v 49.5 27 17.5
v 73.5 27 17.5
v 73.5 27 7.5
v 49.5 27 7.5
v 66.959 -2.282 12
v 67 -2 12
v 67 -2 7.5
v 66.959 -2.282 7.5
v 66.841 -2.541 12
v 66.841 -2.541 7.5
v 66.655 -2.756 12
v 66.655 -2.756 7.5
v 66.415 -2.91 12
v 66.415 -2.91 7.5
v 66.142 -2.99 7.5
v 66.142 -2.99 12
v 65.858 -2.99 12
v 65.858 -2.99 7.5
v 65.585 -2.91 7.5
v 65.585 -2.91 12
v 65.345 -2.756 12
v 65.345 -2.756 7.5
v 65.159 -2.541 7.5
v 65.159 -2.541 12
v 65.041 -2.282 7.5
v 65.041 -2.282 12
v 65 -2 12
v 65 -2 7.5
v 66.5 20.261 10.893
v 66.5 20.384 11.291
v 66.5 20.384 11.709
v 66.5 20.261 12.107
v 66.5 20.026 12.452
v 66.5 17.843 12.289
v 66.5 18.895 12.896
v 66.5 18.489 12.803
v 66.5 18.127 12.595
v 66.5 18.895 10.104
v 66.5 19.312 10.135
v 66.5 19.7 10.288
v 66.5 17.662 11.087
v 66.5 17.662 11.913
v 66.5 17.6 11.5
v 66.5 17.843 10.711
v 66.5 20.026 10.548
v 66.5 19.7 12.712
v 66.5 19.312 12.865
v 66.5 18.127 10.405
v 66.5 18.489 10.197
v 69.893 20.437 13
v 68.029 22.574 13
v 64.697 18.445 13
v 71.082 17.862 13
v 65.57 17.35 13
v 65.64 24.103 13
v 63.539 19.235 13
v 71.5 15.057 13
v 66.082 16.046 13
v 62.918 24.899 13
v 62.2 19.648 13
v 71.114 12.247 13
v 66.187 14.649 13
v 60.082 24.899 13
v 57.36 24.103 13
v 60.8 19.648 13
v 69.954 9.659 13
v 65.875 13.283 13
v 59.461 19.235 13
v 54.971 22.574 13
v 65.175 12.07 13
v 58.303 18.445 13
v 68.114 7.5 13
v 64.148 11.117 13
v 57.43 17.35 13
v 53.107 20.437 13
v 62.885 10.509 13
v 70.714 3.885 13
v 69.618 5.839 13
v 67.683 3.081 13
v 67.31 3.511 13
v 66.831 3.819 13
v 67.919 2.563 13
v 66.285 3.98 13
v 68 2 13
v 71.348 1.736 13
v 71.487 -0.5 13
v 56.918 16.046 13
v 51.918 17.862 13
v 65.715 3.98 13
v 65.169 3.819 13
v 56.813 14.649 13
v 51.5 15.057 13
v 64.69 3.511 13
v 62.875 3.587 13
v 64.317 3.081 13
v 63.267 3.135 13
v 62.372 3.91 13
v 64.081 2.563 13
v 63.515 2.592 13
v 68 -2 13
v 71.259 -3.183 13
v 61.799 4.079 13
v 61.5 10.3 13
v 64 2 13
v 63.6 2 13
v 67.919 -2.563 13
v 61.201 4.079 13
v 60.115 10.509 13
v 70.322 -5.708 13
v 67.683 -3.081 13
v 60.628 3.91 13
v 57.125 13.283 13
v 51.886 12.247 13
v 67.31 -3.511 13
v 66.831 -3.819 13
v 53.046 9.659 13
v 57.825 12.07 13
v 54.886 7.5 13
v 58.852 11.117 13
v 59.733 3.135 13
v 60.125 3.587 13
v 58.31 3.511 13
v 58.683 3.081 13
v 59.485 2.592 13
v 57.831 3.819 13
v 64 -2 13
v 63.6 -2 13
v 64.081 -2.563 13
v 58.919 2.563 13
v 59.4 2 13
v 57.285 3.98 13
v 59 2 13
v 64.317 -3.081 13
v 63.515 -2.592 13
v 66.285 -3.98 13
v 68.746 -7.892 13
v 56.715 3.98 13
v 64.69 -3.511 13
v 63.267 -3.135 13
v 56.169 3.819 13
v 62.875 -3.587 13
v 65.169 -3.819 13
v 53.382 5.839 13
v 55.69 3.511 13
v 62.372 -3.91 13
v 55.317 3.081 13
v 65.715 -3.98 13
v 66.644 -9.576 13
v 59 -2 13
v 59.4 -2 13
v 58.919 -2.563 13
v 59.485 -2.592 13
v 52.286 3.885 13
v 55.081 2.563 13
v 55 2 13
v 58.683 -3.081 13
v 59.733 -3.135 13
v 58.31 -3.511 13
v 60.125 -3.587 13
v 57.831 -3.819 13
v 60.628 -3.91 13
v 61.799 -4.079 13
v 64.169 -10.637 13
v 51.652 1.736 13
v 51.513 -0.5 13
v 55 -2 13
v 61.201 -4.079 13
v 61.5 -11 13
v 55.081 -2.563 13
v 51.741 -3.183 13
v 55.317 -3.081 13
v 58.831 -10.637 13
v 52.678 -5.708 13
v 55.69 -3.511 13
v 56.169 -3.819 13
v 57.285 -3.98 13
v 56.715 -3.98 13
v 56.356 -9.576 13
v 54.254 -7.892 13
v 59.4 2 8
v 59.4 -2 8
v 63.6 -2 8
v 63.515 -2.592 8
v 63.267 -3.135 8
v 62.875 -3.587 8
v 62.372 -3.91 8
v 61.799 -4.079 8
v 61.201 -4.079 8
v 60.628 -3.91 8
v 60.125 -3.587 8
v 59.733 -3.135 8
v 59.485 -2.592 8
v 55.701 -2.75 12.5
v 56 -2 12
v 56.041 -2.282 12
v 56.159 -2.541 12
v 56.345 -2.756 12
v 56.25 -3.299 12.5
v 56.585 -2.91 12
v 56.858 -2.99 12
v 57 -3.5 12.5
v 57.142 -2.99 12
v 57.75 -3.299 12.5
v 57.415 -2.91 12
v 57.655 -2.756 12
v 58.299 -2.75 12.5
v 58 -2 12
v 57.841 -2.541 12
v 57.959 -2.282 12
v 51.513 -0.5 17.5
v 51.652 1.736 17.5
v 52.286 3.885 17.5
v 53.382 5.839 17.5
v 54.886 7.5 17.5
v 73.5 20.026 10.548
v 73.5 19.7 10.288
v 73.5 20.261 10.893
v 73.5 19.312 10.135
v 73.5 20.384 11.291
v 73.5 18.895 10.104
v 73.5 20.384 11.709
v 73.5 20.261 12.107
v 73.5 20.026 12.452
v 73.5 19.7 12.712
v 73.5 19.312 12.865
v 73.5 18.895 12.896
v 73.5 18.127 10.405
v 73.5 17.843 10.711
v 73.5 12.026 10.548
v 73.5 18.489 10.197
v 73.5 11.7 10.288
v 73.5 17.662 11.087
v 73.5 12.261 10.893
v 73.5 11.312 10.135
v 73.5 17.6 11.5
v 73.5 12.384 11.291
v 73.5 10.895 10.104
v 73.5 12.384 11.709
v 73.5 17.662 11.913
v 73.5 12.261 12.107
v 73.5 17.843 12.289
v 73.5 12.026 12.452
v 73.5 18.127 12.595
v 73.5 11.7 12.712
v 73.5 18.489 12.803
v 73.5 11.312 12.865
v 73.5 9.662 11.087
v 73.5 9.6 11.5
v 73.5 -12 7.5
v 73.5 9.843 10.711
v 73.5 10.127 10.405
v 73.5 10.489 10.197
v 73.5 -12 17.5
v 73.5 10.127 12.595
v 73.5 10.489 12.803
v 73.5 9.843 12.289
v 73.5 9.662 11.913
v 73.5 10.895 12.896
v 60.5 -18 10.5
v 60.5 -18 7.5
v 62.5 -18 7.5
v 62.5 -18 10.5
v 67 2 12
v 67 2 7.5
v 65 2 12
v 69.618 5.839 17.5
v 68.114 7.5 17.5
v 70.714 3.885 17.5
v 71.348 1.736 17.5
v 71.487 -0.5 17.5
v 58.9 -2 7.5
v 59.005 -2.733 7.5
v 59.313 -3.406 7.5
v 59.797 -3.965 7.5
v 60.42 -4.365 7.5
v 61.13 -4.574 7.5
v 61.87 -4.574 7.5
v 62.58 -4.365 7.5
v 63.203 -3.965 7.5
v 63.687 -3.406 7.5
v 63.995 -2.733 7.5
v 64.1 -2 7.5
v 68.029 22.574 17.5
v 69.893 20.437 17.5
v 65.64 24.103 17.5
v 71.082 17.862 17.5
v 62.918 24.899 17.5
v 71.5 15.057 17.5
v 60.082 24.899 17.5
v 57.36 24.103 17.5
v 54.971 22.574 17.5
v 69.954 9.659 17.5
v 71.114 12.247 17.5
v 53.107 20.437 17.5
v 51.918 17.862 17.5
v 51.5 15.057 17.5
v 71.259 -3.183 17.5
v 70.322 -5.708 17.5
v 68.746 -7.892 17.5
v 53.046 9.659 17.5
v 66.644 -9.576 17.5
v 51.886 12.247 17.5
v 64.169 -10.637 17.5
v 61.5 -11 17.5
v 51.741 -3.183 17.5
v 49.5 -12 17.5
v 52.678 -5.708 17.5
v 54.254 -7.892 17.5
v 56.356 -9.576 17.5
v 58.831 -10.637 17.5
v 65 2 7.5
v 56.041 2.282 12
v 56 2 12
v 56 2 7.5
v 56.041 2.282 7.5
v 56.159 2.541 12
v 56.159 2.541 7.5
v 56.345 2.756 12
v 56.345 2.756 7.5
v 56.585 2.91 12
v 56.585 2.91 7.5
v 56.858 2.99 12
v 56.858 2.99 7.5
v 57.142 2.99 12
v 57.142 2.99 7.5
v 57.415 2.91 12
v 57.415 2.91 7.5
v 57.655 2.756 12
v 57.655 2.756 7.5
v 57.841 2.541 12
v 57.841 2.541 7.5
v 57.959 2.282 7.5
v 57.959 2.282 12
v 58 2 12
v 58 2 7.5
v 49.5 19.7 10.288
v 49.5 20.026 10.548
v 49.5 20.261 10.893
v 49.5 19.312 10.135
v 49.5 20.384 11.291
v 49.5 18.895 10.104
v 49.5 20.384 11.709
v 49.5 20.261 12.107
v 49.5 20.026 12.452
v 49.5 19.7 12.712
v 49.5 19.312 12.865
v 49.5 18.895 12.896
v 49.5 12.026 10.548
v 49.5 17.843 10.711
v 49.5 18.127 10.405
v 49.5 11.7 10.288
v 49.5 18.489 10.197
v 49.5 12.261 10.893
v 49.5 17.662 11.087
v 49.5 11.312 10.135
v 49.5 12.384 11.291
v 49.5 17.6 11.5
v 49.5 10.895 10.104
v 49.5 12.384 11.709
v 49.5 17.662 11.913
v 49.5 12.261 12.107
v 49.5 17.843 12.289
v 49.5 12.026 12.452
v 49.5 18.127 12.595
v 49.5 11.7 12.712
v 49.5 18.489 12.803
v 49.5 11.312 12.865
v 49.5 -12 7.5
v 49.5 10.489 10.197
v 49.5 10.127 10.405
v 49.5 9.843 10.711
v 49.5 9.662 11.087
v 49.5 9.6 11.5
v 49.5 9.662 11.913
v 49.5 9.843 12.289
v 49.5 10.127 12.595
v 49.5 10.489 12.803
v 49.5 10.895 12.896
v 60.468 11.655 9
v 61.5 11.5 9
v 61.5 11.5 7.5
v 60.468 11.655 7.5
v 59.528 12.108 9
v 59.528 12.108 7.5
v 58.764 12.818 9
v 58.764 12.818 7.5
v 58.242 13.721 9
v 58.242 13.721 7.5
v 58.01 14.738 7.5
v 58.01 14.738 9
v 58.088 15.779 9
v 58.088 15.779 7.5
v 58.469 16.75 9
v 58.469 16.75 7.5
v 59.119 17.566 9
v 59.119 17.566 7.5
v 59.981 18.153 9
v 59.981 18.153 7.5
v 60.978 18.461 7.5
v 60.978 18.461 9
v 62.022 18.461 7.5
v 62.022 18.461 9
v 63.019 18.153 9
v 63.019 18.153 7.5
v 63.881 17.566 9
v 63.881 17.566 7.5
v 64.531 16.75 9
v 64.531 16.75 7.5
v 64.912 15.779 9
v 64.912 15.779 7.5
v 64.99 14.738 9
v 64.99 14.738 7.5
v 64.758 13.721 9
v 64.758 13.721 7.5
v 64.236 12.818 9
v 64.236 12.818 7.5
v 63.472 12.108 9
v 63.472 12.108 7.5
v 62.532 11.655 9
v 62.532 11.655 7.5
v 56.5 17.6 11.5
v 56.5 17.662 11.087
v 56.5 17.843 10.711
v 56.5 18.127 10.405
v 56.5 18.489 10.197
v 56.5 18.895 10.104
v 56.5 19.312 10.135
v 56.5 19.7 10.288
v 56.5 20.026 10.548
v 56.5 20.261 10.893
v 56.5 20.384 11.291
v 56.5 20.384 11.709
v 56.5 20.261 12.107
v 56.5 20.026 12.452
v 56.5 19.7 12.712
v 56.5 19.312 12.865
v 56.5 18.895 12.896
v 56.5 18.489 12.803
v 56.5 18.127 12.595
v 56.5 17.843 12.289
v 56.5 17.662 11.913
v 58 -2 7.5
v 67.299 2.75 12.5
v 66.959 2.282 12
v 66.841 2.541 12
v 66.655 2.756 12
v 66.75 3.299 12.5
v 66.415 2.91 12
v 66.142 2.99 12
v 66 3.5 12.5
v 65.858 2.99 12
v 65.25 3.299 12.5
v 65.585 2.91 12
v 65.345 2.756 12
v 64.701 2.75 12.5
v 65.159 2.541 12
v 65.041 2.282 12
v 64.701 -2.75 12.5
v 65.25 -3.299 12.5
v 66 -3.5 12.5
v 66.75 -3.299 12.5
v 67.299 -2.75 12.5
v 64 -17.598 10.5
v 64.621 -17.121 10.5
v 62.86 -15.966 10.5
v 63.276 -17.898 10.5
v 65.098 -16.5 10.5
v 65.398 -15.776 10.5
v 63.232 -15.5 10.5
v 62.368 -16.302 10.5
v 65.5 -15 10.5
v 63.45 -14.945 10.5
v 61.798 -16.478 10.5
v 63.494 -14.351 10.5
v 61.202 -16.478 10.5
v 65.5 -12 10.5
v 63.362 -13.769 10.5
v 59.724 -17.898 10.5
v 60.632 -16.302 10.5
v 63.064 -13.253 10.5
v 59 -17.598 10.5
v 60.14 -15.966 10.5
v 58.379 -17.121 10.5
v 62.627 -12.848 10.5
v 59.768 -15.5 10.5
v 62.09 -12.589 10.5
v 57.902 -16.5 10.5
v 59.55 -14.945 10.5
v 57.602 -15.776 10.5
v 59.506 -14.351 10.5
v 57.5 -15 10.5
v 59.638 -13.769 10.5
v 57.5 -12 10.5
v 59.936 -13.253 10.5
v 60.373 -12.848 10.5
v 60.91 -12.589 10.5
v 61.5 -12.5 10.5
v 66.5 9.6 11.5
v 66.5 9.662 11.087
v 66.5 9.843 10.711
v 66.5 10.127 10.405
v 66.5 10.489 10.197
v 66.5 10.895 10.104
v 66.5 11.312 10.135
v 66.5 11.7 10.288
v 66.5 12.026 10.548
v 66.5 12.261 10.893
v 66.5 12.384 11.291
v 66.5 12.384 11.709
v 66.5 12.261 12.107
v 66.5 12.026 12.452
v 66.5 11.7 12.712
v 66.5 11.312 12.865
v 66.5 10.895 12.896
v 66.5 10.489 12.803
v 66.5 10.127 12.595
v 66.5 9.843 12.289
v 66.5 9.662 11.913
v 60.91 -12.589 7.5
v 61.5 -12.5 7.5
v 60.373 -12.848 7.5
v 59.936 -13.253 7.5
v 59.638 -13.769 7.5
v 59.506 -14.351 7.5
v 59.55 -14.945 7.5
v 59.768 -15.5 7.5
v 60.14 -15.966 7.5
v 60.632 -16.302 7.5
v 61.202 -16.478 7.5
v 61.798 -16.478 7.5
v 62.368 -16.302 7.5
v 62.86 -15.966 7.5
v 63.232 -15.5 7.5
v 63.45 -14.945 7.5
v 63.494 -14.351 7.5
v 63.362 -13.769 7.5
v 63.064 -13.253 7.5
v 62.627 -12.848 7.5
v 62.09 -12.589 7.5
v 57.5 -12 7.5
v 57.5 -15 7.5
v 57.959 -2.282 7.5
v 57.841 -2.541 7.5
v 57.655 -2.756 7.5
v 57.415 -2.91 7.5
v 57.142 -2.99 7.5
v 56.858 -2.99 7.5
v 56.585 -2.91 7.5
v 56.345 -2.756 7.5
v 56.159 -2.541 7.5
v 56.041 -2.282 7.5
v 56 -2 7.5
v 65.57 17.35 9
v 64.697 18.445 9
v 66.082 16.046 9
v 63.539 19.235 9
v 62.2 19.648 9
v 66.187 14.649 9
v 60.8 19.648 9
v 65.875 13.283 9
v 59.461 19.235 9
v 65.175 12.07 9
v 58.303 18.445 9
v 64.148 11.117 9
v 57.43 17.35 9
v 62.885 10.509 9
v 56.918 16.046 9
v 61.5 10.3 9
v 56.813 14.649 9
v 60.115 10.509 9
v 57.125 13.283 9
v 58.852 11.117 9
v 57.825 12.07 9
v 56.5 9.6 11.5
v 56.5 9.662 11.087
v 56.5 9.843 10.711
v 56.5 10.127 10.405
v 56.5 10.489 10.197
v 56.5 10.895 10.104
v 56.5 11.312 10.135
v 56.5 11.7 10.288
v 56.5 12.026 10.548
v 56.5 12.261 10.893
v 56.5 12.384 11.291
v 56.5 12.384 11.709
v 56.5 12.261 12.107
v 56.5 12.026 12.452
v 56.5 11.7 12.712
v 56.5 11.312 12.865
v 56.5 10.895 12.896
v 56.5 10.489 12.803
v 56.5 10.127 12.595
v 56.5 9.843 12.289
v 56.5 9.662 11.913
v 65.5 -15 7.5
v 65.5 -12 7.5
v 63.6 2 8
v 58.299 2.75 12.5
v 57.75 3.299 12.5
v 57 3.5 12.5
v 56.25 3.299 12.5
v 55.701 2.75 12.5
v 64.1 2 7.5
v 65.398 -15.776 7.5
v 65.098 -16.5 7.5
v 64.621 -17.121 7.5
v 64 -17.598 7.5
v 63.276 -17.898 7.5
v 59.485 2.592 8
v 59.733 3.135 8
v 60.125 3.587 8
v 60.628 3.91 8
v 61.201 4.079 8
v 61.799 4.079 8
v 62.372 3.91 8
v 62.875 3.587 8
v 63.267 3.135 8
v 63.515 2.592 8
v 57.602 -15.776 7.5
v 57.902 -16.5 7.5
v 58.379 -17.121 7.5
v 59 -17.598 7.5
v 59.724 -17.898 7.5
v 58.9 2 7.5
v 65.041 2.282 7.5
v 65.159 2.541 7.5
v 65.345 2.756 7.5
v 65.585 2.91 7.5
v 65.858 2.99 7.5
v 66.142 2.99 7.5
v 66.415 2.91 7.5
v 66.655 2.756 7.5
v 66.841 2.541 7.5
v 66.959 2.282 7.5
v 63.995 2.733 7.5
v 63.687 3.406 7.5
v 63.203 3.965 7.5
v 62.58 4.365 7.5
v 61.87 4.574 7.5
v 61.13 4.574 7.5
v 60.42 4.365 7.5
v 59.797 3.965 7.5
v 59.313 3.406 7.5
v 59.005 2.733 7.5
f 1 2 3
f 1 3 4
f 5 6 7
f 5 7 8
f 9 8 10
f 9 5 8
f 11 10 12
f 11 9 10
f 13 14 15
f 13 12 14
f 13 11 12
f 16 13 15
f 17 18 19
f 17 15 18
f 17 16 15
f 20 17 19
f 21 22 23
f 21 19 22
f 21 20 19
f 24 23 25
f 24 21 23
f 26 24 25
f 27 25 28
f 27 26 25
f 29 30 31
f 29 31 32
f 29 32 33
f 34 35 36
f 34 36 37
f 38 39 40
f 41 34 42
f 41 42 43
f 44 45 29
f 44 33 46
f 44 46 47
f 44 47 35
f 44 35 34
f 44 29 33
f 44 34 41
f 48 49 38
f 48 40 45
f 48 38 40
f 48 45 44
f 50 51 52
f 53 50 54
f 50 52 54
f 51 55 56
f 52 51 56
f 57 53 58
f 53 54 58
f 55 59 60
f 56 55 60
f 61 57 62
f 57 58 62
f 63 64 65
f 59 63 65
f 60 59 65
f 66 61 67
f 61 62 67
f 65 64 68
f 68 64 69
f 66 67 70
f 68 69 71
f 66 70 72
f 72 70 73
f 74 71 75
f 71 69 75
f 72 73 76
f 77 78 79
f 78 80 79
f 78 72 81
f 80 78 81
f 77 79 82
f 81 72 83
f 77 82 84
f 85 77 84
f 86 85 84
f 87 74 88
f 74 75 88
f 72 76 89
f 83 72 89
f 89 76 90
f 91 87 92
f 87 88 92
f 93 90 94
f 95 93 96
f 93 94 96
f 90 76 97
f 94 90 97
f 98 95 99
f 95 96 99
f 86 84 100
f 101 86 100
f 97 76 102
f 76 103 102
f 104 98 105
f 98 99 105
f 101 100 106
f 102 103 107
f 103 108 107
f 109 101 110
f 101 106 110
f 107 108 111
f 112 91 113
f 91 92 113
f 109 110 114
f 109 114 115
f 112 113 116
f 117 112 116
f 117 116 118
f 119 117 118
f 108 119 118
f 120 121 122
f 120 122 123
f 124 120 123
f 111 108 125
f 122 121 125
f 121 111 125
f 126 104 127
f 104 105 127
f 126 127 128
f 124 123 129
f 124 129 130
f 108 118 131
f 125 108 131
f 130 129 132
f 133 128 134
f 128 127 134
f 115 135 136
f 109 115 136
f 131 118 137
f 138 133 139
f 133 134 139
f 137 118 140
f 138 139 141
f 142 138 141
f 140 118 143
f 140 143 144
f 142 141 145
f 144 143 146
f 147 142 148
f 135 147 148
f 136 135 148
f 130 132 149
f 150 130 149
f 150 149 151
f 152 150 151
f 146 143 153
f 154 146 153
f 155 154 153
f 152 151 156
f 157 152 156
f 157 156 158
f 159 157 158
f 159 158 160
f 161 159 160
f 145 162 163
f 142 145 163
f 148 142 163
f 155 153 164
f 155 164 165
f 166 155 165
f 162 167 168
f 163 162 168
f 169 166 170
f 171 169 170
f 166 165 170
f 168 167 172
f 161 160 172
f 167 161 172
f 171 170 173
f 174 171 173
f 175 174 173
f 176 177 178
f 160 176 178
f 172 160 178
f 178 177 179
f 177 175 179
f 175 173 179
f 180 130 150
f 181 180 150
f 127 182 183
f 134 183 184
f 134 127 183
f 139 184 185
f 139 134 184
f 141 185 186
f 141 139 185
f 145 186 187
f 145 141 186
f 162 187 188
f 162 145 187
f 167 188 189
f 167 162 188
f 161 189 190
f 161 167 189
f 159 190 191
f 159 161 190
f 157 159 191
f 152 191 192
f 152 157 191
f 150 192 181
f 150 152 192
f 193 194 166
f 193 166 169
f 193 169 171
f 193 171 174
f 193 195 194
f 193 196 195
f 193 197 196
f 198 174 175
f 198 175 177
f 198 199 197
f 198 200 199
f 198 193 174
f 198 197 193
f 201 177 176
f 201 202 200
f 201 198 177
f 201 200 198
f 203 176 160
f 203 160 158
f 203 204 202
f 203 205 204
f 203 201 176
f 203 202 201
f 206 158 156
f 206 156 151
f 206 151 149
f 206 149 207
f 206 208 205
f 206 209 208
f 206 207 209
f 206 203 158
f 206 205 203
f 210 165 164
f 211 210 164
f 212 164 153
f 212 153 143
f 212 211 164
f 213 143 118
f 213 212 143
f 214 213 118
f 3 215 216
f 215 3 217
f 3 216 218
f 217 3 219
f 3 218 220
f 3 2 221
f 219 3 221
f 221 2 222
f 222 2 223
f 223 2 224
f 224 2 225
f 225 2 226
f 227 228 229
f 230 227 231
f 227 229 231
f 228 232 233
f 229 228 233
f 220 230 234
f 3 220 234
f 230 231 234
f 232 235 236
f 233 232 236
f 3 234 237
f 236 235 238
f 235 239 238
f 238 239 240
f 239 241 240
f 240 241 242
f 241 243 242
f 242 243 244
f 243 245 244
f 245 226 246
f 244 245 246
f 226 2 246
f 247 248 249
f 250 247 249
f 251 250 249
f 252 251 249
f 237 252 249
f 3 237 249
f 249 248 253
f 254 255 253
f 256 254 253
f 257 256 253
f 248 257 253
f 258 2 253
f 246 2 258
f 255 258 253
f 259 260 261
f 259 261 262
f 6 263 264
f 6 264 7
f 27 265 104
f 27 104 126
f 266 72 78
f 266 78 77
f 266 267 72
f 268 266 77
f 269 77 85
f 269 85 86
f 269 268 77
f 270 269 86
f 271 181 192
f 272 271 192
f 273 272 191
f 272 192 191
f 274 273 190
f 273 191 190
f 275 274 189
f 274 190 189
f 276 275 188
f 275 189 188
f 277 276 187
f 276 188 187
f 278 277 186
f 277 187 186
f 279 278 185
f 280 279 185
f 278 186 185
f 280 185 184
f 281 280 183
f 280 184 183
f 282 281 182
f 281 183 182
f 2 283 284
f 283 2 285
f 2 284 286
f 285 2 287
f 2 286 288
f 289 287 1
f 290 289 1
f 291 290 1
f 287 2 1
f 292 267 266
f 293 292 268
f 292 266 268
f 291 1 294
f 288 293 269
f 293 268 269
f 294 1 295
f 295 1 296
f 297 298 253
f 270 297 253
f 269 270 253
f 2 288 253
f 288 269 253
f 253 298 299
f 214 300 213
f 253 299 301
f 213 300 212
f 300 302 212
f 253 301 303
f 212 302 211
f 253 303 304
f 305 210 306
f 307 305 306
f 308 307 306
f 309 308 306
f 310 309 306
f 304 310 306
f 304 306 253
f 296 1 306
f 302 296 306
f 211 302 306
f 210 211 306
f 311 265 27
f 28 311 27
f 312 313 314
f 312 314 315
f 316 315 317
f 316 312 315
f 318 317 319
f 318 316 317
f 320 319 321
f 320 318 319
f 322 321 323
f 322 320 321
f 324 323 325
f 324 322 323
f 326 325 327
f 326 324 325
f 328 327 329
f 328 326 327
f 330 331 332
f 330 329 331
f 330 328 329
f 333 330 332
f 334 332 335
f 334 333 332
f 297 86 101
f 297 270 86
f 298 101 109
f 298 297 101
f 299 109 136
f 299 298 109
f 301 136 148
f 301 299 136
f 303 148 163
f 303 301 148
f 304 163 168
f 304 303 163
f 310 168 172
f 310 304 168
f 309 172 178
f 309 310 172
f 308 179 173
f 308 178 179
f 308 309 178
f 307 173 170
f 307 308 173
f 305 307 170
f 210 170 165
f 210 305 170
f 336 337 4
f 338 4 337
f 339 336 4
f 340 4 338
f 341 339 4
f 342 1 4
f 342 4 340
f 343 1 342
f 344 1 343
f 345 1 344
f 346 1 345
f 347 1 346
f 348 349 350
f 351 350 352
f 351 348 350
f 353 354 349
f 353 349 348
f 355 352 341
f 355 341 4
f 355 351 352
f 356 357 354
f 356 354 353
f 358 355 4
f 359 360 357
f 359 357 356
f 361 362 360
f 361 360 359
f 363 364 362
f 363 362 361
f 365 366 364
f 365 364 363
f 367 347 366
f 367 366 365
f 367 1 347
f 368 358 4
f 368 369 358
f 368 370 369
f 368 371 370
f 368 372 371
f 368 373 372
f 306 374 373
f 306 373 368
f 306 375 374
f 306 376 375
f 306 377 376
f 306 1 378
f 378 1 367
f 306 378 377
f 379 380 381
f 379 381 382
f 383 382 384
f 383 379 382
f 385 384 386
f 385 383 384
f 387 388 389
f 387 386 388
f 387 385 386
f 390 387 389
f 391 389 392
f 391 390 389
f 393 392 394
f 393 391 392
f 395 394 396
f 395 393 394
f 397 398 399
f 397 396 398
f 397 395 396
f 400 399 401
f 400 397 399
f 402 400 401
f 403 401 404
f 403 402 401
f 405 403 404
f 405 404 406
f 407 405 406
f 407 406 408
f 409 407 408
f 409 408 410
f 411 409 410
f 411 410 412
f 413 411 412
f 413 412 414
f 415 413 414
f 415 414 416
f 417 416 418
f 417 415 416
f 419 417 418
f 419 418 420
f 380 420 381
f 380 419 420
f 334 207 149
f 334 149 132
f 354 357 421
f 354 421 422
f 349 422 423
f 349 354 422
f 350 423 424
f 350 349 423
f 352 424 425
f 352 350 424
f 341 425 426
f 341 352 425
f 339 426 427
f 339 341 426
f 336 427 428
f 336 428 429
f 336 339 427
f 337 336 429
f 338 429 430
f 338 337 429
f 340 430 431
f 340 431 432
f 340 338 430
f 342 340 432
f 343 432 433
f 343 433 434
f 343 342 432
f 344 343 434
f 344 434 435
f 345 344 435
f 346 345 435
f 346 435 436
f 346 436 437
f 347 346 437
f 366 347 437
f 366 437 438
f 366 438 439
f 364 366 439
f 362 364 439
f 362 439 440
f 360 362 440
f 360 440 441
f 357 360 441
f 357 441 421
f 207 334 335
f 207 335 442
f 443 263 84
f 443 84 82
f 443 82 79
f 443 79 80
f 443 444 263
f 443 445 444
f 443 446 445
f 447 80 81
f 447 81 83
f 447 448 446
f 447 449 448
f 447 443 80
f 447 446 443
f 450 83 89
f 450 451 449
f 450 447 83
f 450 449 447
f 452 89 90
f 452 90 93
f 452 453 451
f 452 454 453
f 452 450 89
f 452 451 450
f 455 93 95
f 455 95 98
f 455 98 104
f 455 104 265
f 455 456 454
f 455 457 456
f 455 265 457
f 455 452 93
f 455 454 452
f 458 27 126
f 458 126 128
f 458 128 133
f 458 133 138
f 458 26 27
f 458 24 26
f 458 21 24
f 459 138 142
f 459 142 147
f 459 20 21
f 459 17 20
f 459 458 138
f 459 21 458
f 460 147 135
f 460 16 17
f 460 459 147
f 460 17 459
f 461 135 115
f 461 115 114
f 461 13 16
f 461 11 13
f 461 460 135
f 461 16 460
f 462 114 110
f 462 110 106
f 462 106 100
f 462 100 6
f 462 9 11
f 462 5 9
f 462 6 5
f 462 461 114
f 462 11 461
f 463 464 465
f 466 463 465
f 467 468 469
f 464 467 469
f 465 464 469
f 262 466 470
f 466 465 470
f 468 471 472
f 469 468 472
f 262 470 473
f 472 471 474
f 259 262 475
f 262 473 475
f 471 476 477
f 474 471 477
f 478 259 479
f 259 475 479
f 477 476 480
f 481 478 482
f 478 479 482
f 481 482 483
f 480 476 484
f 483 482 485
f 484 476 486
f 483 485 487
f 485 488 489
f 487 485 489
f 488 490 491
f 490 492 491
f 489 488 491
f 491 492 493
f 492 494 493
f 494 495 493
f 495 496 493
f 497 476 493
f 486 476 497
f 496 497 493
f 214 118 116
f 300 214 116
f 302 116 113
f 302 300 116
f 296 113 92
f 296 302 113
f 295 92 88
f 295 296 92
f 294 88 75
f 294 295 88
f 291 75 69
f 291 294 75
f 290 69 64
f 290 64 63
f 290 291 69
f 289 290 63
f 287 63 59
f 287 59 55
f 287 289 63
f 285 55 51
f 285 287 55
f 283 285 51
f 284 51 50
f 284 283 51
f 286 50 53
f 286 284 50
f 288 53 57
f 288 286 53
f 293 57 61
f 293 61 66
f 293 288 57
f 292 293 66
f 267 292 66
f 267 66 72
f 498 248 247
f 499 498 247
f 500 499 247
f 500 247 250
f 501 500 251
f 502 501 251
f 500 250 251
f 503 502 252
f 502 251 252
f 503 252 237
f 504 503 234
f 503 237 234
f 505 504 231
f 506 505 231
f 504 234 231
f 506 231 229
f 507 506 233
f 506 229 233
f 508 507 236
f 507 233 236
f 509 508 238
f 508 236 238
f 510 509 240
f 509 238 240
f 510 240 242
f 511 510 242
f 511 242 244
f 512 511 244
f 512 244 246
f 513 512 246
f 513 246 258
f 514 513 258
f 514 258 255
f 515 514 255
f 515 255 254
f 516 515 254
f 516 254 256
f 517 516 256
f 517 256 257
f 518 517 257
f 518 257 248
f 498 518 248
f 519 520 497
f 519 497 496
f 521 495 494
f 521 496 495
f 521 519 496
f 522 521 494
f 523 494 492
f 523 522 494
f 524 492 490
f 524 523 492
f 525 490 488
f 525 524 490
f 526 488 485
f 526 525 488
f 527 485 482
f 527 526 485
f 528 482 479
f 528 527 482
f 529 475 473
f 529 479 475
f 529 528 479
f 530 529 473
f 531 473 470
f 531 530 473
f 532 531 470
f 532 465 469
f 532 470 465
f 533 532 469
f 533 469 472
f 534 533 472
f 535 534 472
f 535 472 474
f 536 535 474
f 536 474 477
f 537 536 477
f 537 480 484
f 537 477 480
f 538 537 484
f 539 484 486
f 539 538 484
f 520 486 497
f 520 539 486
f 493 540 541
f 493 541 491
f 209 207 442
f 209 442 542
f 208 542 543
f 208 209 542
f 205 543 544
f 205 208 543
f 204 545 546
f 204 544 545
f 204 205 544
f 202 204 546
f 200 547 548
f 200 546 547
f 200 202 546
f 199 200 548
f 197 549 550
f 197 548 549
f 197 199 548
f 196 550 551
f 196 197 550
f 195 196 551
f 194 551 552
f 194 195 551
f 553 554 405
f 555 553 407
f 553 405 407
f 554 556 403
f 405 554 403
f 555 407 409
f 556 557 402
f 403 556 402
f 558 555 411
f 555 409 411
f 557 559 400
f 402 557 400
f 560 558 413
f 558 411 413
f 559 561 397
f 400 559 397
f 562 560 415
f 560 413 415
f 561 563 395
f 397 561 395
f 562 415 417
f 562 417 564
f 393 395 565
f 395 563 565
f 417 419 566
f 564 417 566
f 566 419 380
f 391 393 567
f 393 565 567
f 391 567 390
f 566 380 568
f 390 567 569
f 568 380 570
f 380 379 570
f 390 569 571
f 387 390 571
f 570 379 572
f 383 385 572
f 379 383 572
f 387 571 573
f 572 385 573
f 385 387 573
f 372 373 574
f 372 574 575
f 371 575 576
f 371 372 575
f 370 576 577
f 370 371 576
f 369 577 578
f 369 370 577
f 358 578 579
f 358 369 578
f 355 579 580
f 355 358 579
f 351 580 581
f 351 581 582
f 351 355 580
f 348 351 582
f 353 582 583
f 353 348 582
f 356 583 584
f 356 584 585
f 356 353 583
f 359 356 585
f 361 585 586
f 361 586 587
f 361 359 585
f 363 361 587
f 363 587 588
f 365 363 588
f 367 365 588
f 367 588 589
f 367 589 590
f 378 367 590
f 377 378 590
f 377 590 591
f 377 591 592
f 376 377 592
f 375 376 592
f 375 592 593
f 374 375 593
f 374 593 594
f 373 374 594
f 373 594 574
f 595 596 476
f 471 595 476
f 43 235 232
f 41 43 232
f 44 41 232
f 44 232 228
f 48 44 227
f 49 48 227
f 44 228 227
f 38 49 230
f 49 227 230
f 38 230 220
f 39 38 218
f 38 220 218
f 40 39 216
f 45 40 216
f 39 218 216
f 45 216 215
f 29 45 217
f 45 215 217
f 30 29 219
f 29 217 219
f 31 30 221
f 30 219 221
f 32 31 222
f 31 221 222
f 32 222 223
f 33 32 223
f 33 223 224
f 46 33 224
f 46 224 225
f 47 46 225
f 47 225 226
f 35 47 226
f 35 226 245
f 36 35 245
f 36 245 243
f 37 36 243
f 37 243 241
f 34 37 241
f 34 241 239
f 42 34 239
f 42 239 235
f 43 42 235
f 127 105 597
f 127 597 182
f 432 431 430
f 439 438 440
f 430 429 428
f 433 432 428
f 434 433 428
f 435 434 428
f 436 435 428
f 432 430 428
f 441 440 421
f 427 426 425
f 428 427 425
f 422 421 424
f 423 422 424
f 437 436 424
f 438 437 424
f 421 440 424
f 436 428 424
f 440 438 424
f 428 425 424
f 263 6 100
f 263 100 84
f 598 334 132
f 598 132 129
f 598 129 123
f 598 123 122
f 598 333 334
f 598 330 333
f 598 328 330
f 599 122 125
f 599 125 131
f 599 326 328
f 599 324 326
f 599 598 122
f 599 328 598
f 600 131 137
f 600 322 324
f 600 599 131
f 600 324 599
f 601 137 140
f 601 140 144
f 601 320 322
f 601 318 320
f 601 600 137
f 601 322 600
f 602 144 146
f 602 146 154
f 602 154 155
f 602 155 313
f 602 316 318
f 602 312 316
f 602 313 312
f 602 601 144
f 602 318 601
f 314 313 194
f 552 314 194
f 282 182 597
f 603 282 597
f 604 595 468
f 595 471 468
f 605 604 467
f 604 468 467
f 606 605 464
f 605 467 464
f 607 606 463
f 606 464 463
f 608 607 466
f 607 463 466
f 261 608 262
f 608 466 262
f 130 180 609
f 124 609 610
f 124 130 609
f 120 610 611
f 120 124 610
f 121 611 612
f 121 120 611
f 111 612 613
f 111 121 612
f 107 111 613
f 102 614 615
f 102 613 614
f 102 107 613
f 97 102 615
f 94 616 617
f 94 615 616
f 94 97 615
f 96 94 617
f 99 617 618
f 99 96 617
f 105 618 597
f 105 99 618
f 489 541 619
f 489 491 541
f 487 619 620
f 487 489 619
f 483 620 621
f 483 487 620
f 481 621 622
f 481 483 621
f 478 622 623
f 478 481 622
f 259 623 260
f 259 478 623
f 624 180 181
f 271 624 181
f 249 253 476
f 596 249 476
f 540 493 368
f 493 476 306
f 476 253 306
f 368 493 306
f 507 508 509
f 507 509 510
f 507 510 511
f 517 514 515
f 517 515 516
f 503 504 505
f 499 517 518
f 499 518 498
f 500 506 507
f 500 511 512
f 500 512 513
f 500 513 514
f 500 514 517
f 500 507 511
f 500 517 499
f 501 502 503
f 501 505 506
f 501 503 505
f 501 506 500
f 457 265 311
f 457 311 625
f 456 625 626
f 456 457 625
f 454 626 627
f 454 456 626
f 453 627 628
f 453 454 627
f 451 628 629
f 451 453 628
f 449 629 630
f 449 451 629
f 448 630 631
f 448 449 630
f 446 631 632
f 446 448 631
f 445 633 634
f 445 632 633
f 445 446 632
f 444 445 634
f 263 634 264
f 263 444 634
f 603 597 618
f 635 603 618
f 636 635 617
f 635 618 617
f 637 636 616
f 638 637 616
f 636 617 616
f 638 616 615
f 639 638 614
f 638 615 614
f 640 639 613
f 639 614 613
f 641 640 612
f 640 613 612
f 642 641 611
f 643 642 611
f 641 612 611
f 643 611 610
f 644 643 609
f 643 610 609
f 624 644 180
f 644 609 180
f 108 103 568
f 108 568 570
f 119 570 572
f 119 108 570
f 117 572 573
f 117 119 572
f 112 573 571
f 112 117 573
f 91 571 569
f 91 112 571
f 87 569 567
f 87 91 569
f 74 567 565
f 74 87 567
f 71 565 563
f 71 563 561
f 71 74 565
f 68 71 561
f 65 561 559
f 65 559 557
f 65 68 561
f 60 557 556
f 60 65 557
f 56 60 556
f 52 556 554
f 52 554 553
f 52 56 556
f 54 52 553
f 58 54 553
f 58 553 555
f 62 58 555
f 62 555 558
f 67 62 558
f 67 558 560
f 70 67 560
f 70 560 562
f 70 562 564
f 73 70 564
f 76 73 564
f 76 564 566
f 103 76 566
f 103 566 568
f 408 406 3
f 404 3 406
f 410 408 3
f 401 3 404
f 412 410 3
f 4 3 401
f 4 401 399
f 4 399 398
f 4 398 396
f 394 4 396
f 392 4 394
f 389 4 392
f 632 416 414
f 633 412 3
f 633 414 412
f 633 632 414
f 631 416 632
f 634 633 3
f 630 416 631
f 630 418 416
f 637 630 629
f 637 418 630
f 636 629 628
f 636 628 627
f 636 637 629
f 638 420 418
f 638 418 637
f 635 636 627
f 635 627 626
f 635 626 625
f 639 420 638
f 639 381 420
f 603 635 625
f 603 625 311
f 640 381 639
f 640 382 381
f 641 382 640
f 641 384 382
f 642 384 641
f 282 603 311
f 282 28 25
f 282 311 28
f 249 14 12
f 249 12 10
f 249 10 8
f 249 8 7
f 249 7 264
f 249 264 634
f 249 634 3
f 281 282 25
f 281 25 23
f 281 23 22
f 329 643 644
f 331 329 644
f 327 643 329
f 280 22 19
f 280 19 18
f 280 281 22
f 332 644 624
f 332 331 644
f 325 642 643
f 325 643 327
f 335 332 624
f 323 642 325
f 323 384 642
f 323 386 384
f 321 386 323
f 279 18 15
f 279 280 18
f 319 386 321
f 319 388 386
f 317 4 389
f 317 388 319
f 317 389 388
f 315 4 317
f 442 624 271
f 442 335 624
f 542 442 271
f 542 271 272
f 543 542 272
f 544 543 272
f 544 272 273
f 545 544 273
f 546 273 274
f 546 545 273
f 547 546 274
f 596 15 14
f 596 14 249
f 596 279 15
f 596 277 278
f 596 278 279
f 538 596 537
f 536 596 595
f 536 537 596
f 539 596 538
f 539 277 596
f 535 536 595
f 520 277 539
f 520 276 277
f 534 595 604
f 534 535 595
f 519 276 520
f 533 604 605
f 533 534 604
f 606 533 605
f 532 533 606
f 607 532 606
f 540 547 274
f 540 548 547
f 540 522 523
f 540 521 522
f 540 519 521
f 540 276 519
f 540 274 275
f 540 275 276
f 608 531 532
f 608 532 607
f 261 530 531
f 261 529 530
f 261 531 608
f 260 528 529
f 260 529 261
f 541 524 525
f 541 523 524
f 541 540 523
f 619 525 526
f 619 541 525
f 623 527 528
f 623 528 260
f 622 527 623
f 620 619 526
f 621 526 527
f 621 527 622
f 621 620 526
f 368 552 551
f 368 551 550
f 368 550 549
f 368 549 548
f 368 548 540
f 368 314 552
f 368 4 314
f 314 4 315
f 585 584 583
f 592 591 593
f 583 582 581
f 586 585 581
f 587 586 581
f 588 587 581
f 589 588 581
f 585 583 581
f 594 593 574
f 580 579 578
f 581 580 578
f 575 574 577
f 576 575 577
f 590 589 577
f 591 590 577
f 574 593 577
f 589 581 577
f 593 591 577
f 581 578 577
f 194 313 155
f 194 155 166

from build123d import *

# Parameters (mm, degrees)
CYLINDER267_R                = 2
CYLINDER267_DEPTH            = 10
CYLINDER267_PITCH_ANGLE      = 90
BOX001027045199_W            = 3
BOX001027045199_H            = 8
BOX001027045199_DEPTH        = 8
FILLET045_R                  = 3
CUT239_PITCH_ANGLE           = 90
CYLINDER103_R                = 1.4
CYLINDER103_DEPTH            = 19
CYLINDER103_ROLL_ANGLE       = 90
CYLINDER105_R                = 1.4
CYLINDER105_DEPTH            = 19
CYLINDER105_ROLL_ANGLE       = 90
CYLINDER106_R                = 1.4
CYLINDER106_DEPTH            = 19
CYLINDER106_ROLL_ANGLE       = 90
CYLINDER027_R                = 1.4
CYLINDER027_DEPTH            = 19
CYLINDER027_ROLL_ANGLE       = 90
CYLINDER098_R                = 1
CYLINDER098_DEPTH            = 30
CYLINDER099_R                = 1
CYLINDER099_DEPTH            = 30
BOX001007_W                  = 4
BOX001007_H                  = 4.2
BOX001007_DEPTH              = 27
CYLINDER097_R                = 2.1
CYLINDER097_DEPTH            = 30
CYLINDER023_R                = 2.1
CYLINDER023_DEPTH            = 30
CYLINDER100_R                = 1
CYLINDER100_DEPTH            = 30
BOX001008_W                  = 4
BOX001008_H                  = 2
BOX001008_DEPTH              = 27
CYLINDER101_R                = 1
CYLINDER101_DEPTH            = 30
BOX001009_W                  = 4
BOX001009_H                  = 2
BOX001009_DEPTH              = 27
CYLINDER093_R                = 3.5
CYLINDER093_DEPTH            = 30
CYLINDER094_R                = 4.7
CYLINDER094_DEPTH            = 30
CYLINDER095_R                = 10
CYLINDER095_DEPTH            = 30
CYLINDER102_R                = 10
CYLINDER102_DEPTH            = 30
CYLINDER096_R                = 10
CYLINDER096_DEPTH            = 30
BOX001006_W                  = 39
BOX001006_H                  = 24
BOX001006_DEPTH              = 10
CHAMFER008_SIZE              = 1
CHAMFER014_SIZE              = 0.5
FUSION112154_ROLL_ANGLE      = 180
FUSION112154_PLACEMENT_ANGLE = -90


with BuildPart() as cylinder285:
    # Cylinder267 → Cylinder267 (new body)
    with BuildSketch(Plane.XY):
        Circle(CYLINDER267_R)
    extrude(amount=CYLINDER267_DEPTH)


with BuildPart() as cylinder285_1:
    # Cylinder267 pitch: moved
    add(cylinder285.part.rotate(Axis((0, 0, 0), (0, 1, 0)), CYLINDER267_PITCH_ANGLE))


with BuildPart() as cylinder285_2:
    # Cylinder267 placement: moved
    add(cylinder285_1.part.moved(Location((-3, 4, 4.5))))


with BuildPart() as cut239:
    # Box001027045199 → Box001027045199 (new body)
    with BuildSketch(Plane.XY):
        with Locations((1.5, 4)):
            Rectangle(BOX001027045199_W, BOX001027045199_H)
    extrude(amount=BOX001027045199_DEPTH)

    # Fillet045
    fillet045_edges = [cut239.edges().sort_by_distance(p)[0] for p in [
        (1.5, 0, 8),
        (1.5, 8, 8),
    ]]
    fillet(fillet045_edges, radius=FILLET045_R)

    # Cut239: cut Cylinder285
    add(cylinder285_2.part, mode=Mode.SUBTRACT)


with BuildPart() as cut239_1:
    # Cut239 pitch: moved
    add(cut239.part.rotate(Axis((0, 0, 0), (0, 1, 0)), CUT239_PITCH_ANGLE))


with BuildPart() as cut239_2:
    # Cut239 placement: moved
    add(cut239_1.part.moved(Location((25, -4, 10))))


with BuildPart() as cylinder103:
    # Cylinder103 → Cylinder103 (new body)
    with BuildSketch(Plane.XY):
        Circle(CYLINDER103_R)
    extrude(amount=CYLINDER103_DEPTH)


with BuildPart() as cylinder103_1:
    # Cylinder103 roll: moved
    add(cylinder103.part.rotate(Axis((0, 0, 0), (1, 0, 0)), CYLINDER103_ROLL_ANGLE))


with BuildPart() as cylinder103_2:
    # Cylinder103 placement: moved
    add(cylinder103_1.part.moved(Location((4, 24, 6))))


with BuildPart() as cylinder105:
    # Cylinder105 → Cylinder105 (new body)
    with BuildSketch(Plane.XY):
        Circle(CYLINDER105_R)
    extrude(amount=CYLINDER105_DEPTH)


with BuildPart() as cylinder105_1:
    # Cylinder105 roll: moved
    add(cylinder105.part.rotate(Axis((0, 0, 0), (1, 0, 0)), CYLINDER105_ROLL_ANGLE))


with BuildPart() as cylinder105_2:
    # Cylinder105 placement: moved
    add(cylinder105_1.part.moved(Location((-4, 24, 6))))


with BuildPart() as part_mirroring011:
    # Part__Mirroring011: instance of Cylinder105
    add(cylinder105_2.part.mirror(Plane(origin=(0, 0, 0), x_dir=(1, 0, 0), z_dir=(0, 1, 0))))


with BuildPart() as cylinder106:
    # Cylinder106 → Cylinder106 (new body)
    with BuildSketch(Plane.XY):
        Circle(CYLINDER106_R)
    extrude(amount=CYLINDER106_DEPTH)


with BuildPart() as cylinder106_1:
    # Cylinder106 roll: moved
    add(cylinder106.part.rotate(Axis((0, 0, 0), (1, 0, 0)), CYLINDER106_ROLL_ANGLE))


with BuildPart() as cylinder106_2:
    # Cylinder106 placement: moved
    add(cylinder106_1.part.moved(Location((4, 24, 6))))


with BuildPart() as part_mirroring012:
    # Part__Mirroring012: instance of Cylinder106
    add(cylinder106_2.part.mirror(Plane(origin=(0, 0, 0), x_dir=(1, 0, 0), z_dir=(0, 1, 0))))


with BuildPart() as m3_tap_a:
    # Cylinder027 → Cylinder027 (new body)
    with BuildSketch(Plane.XY):
        Circle(CYLINDER027_R)
    extrude(amount=CYLINDER027_DEPTH)


with BuildPart() as m3_tap_a_1:
    # Cylinder027 roll: moved
    add(m3_tap_a.part.rotate(Axis((0, 0, 0), (1, 0, 0)), CYLINDER027_ROLL_ANGLE))


with BuildPart() as m3_tap_a_2:
    # Cylinder027 placement: moved
    add(m3_tap_a_1.part.moved(Location((-4, 24, 6))))

    # Fusion062: union Cylinder103, Part__Mirroring011, Part__Mirroring012
    add(cylinder103_2.part)
    add(part_mirroring011.part)
    add(part_mirroring012.part)


with BuildPart() as cylinder109:
    # Cylinder098 → Cylinder098 (new body)
    with BuildSketch(Plane(origin=(17, -4.5, -12.5), x_dir=(1, 0, 0), z_dir=(0, 0, 1))):
        Circle(CYLINDER098_R)
    extrude(amount=CYLINDER098_DEPTH)


with BuildPart() as cylinder110:
    # Cylinder099 → Cylinder099 (new body)
    with BuildSketch(Plane(origin=(17, 4.5, -12.5), x_dir=(1, 0, 0), z_dir=(0, 0, 1))):
        Circle(CYLINDER099_R)
    extrude(amount=CYLINDER099_DEPTH)


with BuildPart() as cube046:
    # Box001007 → Box001007 (new body)
    with BuildSketch(Plane(origin=(13, -2.1, -11), x_dir=(1, 0, 0), z_dir=(0, 0, 1))):
        with Locations((2, 2.1)):
            Rectangle(BOX001007_W, BOX001007_H)
    extrude(amount=BOX001007_DEPTH)


with BuildPart() as cylinder108:
    # Cylinder097 → Cylinder097 (new body)
    with BuildSketch(Plane(origin=(17, 0, -12.5), x_dir=(1, 0, 0), z_dir=(0, 0, 1))):
        Circle(CYLINDER097_R)
    extrude(amount=CYLINDER097_DEPTH)


with BuildPart() as cylinder111:
    # Cylinder023 → Cylinder023 (new body)
    with BuildSketch(Plane(origin=(13, 0, -12.5), x_dir=(1, 0, 0), z_dir=(0, 0, 1))):
        Circle(CYLINDER023_R)
    extrude(amount=CYLINDER023_DEPTH)


with BuildPart() as cylinder112:
    # Cylinder100 → Cylinder100 (new body)
    with BuildSketch(Plane(origin=(13, -4.5, -12.5), x_dir=(1, 0, 0), z_dir=(0, 0, 1))):
        Circle(CYLINDER100_R)
    extrude(amount=CYLINDER100_DEPTH)


with BuildPart() as cube047:
    # Box001008 → Box001008 (new body)
    with BuildSketch(Plane(origin=(13, -5.5, -11), x_dir=(1, 0, 0), z_dir=(0, 0, 1))):
        with Locations((2, 1)):
            Rectangle(BOX001008_W, BOX001008_H)
    extrude(amount=BOX001008_DEPTH)


with BuildPart() as cylinder113:
    # Cylinder101 → Cylinder101 (new body)
    with BuildSketch(Plane(origin=(13, 4.5, -12.5), x_dir=(1, 0, 0), z_dir=(0, 0, 1))):
        Circle(CYLINDER101_R)
    extrude(amount=CYLINDER101_DEPTH)


with BuildPart() as motor_slots:
    # Box001009 → Box001009 (new body)
    with BuildSketch(Plane(origin=(13, 3.5, -11), x_dir=(1, 0, 0), z_dir=(0, 0, 1))):
        with Locations((2, 1)):
            Rectangle(BOX001009_W, BOX001009_H)
    extrude(amount=BOX001009_DEPTH)

    # Fusion058: union Cylinder109, Cylinder110, Cube046, Cylinder108, Cylinder111, Cylinder112, Cube047, Cylinder113
    add(cylinder109.part)
    add(cylinder110.part)
    add(cube046.part)
    add(cylinder108.part)
    add(cylinder111.part)
    add(cylinder112.part)
    add(cube047.part)
    add(cylinder113.part)


with BuildPart() as cylinder104:
    # Cylinder093 → Cylinder093 (new body)
    with BuildSketch(Plane.XY.offset(-12)):
        Circle(CYLINDER093_R)
    extrude(amount=CYLINDER093_DEPTH)


with BuildPart() as cylinder094:
    # Cylinder094 → Cylinder094 (new body)
    with BuildSketch(Plane.XY.offset(-21.5)):
        Circle(CYLINDER094_R)
    extrude(amount=CYLINDER094_DEPTH)


with BuildPart() as cylinder095:
    # Cylinder095 → Cylinder095 (new body)
    with BuildSketch(Plane.XY.offset(-25.5)):
        Circle(CYLINDER095_R)
    extrude(amount=CYLINDER095_DEPTH)


with BuildPart() as cylinder114:
    # Cylinder102 → Cylinder102 (new body)
    with BuildSketch(Plane(origin=(15, 0, -25.5), x_dir=(1, 0, 0), z_dir=(0, 0, 1))):
        Circle(CYLINDER102_R)
    extrude(amount=CYLINDER102_DEPTH)


with BuildPart() as fusion060:
    # Cylinder096 → Cylinder096 (new body)
    with BuildSketch(Plane(origin=(16, 0, -25.5), x_dir=(1, 0, 0), z_dir=(0, 0, 1))):
        Circle(CYLINDER096_R)
    extrude(amount=CYLINDER096_DEPTH)

    # Fusion059: union Cylinder104, Cylinder094, Cylinder095, Cylinder114
    add(cylinder104.part)
    add(cylinder094.part)
    add(cylinder095.part)
    add(cylinder114.part)

    # Fusion060: union motor-slots
    add(motor_slots.part)


with BuildPart() as gearbox001:
    # Box001006 → Box001006 (new body)
    with BuildSketch(Plane(origin=(-12, -12, 0), x_dir=(1, 0, 0), z_dir=(0, 0, 1))):
        with Locations((19.5, 12)):
            Rectangle(BOX001006_W, BOX001006_H)
    extrude(amount=BOX001006_DEPTH)

    # Cut005: cut Fusion060
    add(fusion060.part, mode=Mode.SUBTRACT)

    # Chamfer008
    chamfer008_edges = [gearbox001.edges().sort_by_distance(p)[0] for p in [
        (12, 4.5, 4.5),
        (15, 3.5, 4.5),
        (17.707107, 3.792893, 4.5),
        (17.707107, 5.207107, 4.5),
        (15, 5.5, 4.5),
        (17.707107, -5.207107, 4.5),
        (17.707107, -3.792893, 4.5),
        (15, -3.5, 4.5),
        (12, -4.5, 4.5),
        (15, -5.5, 4.5),
    ]]
    chamfer(chamfer008_edges, length=CHAMFER008_SIZE)

    # Cut045: cut M3-tap-a
    add(m3_tap_a_2.part, mode=Mode.SUBTRACT)

    # Chamfer014
    chamfer014_edges = [gearbox001.edges().sort_by_distance(p)[0] for p in [
        (18.484924, 1.484924, 10),
        (15, 2.1, 10),
        (10.9, 0, 10),
        (15, -2.1, 10),
        (18.484924, -1.484924, 10),
    ]]
    chamfer(chamfer014_edges, length=CHAMFER014_SIZE)

    # Fusion112154: union Cut239
    add(cut239_2.part)


with BuildPart() as gearbox001_1:
    # Fusion112154 roll: moved
    add(gearbox001.part.rotate(Axis((0, 0, 0), (1, 0, 0)), FUSION112154_ROLL_ANGLE))


with BuildPart() as gearbox001_2:
    # Fusion112154 placement: moved
    add(gearbox001_1.part.moved(Location((61.5, 15, 17.5))).rotate(Axis((61.5, 15, 17.5), (0, 0, 1)), FUSION112154_PLACEMENT_ANGLE))


solid = gearbox001_2.part
